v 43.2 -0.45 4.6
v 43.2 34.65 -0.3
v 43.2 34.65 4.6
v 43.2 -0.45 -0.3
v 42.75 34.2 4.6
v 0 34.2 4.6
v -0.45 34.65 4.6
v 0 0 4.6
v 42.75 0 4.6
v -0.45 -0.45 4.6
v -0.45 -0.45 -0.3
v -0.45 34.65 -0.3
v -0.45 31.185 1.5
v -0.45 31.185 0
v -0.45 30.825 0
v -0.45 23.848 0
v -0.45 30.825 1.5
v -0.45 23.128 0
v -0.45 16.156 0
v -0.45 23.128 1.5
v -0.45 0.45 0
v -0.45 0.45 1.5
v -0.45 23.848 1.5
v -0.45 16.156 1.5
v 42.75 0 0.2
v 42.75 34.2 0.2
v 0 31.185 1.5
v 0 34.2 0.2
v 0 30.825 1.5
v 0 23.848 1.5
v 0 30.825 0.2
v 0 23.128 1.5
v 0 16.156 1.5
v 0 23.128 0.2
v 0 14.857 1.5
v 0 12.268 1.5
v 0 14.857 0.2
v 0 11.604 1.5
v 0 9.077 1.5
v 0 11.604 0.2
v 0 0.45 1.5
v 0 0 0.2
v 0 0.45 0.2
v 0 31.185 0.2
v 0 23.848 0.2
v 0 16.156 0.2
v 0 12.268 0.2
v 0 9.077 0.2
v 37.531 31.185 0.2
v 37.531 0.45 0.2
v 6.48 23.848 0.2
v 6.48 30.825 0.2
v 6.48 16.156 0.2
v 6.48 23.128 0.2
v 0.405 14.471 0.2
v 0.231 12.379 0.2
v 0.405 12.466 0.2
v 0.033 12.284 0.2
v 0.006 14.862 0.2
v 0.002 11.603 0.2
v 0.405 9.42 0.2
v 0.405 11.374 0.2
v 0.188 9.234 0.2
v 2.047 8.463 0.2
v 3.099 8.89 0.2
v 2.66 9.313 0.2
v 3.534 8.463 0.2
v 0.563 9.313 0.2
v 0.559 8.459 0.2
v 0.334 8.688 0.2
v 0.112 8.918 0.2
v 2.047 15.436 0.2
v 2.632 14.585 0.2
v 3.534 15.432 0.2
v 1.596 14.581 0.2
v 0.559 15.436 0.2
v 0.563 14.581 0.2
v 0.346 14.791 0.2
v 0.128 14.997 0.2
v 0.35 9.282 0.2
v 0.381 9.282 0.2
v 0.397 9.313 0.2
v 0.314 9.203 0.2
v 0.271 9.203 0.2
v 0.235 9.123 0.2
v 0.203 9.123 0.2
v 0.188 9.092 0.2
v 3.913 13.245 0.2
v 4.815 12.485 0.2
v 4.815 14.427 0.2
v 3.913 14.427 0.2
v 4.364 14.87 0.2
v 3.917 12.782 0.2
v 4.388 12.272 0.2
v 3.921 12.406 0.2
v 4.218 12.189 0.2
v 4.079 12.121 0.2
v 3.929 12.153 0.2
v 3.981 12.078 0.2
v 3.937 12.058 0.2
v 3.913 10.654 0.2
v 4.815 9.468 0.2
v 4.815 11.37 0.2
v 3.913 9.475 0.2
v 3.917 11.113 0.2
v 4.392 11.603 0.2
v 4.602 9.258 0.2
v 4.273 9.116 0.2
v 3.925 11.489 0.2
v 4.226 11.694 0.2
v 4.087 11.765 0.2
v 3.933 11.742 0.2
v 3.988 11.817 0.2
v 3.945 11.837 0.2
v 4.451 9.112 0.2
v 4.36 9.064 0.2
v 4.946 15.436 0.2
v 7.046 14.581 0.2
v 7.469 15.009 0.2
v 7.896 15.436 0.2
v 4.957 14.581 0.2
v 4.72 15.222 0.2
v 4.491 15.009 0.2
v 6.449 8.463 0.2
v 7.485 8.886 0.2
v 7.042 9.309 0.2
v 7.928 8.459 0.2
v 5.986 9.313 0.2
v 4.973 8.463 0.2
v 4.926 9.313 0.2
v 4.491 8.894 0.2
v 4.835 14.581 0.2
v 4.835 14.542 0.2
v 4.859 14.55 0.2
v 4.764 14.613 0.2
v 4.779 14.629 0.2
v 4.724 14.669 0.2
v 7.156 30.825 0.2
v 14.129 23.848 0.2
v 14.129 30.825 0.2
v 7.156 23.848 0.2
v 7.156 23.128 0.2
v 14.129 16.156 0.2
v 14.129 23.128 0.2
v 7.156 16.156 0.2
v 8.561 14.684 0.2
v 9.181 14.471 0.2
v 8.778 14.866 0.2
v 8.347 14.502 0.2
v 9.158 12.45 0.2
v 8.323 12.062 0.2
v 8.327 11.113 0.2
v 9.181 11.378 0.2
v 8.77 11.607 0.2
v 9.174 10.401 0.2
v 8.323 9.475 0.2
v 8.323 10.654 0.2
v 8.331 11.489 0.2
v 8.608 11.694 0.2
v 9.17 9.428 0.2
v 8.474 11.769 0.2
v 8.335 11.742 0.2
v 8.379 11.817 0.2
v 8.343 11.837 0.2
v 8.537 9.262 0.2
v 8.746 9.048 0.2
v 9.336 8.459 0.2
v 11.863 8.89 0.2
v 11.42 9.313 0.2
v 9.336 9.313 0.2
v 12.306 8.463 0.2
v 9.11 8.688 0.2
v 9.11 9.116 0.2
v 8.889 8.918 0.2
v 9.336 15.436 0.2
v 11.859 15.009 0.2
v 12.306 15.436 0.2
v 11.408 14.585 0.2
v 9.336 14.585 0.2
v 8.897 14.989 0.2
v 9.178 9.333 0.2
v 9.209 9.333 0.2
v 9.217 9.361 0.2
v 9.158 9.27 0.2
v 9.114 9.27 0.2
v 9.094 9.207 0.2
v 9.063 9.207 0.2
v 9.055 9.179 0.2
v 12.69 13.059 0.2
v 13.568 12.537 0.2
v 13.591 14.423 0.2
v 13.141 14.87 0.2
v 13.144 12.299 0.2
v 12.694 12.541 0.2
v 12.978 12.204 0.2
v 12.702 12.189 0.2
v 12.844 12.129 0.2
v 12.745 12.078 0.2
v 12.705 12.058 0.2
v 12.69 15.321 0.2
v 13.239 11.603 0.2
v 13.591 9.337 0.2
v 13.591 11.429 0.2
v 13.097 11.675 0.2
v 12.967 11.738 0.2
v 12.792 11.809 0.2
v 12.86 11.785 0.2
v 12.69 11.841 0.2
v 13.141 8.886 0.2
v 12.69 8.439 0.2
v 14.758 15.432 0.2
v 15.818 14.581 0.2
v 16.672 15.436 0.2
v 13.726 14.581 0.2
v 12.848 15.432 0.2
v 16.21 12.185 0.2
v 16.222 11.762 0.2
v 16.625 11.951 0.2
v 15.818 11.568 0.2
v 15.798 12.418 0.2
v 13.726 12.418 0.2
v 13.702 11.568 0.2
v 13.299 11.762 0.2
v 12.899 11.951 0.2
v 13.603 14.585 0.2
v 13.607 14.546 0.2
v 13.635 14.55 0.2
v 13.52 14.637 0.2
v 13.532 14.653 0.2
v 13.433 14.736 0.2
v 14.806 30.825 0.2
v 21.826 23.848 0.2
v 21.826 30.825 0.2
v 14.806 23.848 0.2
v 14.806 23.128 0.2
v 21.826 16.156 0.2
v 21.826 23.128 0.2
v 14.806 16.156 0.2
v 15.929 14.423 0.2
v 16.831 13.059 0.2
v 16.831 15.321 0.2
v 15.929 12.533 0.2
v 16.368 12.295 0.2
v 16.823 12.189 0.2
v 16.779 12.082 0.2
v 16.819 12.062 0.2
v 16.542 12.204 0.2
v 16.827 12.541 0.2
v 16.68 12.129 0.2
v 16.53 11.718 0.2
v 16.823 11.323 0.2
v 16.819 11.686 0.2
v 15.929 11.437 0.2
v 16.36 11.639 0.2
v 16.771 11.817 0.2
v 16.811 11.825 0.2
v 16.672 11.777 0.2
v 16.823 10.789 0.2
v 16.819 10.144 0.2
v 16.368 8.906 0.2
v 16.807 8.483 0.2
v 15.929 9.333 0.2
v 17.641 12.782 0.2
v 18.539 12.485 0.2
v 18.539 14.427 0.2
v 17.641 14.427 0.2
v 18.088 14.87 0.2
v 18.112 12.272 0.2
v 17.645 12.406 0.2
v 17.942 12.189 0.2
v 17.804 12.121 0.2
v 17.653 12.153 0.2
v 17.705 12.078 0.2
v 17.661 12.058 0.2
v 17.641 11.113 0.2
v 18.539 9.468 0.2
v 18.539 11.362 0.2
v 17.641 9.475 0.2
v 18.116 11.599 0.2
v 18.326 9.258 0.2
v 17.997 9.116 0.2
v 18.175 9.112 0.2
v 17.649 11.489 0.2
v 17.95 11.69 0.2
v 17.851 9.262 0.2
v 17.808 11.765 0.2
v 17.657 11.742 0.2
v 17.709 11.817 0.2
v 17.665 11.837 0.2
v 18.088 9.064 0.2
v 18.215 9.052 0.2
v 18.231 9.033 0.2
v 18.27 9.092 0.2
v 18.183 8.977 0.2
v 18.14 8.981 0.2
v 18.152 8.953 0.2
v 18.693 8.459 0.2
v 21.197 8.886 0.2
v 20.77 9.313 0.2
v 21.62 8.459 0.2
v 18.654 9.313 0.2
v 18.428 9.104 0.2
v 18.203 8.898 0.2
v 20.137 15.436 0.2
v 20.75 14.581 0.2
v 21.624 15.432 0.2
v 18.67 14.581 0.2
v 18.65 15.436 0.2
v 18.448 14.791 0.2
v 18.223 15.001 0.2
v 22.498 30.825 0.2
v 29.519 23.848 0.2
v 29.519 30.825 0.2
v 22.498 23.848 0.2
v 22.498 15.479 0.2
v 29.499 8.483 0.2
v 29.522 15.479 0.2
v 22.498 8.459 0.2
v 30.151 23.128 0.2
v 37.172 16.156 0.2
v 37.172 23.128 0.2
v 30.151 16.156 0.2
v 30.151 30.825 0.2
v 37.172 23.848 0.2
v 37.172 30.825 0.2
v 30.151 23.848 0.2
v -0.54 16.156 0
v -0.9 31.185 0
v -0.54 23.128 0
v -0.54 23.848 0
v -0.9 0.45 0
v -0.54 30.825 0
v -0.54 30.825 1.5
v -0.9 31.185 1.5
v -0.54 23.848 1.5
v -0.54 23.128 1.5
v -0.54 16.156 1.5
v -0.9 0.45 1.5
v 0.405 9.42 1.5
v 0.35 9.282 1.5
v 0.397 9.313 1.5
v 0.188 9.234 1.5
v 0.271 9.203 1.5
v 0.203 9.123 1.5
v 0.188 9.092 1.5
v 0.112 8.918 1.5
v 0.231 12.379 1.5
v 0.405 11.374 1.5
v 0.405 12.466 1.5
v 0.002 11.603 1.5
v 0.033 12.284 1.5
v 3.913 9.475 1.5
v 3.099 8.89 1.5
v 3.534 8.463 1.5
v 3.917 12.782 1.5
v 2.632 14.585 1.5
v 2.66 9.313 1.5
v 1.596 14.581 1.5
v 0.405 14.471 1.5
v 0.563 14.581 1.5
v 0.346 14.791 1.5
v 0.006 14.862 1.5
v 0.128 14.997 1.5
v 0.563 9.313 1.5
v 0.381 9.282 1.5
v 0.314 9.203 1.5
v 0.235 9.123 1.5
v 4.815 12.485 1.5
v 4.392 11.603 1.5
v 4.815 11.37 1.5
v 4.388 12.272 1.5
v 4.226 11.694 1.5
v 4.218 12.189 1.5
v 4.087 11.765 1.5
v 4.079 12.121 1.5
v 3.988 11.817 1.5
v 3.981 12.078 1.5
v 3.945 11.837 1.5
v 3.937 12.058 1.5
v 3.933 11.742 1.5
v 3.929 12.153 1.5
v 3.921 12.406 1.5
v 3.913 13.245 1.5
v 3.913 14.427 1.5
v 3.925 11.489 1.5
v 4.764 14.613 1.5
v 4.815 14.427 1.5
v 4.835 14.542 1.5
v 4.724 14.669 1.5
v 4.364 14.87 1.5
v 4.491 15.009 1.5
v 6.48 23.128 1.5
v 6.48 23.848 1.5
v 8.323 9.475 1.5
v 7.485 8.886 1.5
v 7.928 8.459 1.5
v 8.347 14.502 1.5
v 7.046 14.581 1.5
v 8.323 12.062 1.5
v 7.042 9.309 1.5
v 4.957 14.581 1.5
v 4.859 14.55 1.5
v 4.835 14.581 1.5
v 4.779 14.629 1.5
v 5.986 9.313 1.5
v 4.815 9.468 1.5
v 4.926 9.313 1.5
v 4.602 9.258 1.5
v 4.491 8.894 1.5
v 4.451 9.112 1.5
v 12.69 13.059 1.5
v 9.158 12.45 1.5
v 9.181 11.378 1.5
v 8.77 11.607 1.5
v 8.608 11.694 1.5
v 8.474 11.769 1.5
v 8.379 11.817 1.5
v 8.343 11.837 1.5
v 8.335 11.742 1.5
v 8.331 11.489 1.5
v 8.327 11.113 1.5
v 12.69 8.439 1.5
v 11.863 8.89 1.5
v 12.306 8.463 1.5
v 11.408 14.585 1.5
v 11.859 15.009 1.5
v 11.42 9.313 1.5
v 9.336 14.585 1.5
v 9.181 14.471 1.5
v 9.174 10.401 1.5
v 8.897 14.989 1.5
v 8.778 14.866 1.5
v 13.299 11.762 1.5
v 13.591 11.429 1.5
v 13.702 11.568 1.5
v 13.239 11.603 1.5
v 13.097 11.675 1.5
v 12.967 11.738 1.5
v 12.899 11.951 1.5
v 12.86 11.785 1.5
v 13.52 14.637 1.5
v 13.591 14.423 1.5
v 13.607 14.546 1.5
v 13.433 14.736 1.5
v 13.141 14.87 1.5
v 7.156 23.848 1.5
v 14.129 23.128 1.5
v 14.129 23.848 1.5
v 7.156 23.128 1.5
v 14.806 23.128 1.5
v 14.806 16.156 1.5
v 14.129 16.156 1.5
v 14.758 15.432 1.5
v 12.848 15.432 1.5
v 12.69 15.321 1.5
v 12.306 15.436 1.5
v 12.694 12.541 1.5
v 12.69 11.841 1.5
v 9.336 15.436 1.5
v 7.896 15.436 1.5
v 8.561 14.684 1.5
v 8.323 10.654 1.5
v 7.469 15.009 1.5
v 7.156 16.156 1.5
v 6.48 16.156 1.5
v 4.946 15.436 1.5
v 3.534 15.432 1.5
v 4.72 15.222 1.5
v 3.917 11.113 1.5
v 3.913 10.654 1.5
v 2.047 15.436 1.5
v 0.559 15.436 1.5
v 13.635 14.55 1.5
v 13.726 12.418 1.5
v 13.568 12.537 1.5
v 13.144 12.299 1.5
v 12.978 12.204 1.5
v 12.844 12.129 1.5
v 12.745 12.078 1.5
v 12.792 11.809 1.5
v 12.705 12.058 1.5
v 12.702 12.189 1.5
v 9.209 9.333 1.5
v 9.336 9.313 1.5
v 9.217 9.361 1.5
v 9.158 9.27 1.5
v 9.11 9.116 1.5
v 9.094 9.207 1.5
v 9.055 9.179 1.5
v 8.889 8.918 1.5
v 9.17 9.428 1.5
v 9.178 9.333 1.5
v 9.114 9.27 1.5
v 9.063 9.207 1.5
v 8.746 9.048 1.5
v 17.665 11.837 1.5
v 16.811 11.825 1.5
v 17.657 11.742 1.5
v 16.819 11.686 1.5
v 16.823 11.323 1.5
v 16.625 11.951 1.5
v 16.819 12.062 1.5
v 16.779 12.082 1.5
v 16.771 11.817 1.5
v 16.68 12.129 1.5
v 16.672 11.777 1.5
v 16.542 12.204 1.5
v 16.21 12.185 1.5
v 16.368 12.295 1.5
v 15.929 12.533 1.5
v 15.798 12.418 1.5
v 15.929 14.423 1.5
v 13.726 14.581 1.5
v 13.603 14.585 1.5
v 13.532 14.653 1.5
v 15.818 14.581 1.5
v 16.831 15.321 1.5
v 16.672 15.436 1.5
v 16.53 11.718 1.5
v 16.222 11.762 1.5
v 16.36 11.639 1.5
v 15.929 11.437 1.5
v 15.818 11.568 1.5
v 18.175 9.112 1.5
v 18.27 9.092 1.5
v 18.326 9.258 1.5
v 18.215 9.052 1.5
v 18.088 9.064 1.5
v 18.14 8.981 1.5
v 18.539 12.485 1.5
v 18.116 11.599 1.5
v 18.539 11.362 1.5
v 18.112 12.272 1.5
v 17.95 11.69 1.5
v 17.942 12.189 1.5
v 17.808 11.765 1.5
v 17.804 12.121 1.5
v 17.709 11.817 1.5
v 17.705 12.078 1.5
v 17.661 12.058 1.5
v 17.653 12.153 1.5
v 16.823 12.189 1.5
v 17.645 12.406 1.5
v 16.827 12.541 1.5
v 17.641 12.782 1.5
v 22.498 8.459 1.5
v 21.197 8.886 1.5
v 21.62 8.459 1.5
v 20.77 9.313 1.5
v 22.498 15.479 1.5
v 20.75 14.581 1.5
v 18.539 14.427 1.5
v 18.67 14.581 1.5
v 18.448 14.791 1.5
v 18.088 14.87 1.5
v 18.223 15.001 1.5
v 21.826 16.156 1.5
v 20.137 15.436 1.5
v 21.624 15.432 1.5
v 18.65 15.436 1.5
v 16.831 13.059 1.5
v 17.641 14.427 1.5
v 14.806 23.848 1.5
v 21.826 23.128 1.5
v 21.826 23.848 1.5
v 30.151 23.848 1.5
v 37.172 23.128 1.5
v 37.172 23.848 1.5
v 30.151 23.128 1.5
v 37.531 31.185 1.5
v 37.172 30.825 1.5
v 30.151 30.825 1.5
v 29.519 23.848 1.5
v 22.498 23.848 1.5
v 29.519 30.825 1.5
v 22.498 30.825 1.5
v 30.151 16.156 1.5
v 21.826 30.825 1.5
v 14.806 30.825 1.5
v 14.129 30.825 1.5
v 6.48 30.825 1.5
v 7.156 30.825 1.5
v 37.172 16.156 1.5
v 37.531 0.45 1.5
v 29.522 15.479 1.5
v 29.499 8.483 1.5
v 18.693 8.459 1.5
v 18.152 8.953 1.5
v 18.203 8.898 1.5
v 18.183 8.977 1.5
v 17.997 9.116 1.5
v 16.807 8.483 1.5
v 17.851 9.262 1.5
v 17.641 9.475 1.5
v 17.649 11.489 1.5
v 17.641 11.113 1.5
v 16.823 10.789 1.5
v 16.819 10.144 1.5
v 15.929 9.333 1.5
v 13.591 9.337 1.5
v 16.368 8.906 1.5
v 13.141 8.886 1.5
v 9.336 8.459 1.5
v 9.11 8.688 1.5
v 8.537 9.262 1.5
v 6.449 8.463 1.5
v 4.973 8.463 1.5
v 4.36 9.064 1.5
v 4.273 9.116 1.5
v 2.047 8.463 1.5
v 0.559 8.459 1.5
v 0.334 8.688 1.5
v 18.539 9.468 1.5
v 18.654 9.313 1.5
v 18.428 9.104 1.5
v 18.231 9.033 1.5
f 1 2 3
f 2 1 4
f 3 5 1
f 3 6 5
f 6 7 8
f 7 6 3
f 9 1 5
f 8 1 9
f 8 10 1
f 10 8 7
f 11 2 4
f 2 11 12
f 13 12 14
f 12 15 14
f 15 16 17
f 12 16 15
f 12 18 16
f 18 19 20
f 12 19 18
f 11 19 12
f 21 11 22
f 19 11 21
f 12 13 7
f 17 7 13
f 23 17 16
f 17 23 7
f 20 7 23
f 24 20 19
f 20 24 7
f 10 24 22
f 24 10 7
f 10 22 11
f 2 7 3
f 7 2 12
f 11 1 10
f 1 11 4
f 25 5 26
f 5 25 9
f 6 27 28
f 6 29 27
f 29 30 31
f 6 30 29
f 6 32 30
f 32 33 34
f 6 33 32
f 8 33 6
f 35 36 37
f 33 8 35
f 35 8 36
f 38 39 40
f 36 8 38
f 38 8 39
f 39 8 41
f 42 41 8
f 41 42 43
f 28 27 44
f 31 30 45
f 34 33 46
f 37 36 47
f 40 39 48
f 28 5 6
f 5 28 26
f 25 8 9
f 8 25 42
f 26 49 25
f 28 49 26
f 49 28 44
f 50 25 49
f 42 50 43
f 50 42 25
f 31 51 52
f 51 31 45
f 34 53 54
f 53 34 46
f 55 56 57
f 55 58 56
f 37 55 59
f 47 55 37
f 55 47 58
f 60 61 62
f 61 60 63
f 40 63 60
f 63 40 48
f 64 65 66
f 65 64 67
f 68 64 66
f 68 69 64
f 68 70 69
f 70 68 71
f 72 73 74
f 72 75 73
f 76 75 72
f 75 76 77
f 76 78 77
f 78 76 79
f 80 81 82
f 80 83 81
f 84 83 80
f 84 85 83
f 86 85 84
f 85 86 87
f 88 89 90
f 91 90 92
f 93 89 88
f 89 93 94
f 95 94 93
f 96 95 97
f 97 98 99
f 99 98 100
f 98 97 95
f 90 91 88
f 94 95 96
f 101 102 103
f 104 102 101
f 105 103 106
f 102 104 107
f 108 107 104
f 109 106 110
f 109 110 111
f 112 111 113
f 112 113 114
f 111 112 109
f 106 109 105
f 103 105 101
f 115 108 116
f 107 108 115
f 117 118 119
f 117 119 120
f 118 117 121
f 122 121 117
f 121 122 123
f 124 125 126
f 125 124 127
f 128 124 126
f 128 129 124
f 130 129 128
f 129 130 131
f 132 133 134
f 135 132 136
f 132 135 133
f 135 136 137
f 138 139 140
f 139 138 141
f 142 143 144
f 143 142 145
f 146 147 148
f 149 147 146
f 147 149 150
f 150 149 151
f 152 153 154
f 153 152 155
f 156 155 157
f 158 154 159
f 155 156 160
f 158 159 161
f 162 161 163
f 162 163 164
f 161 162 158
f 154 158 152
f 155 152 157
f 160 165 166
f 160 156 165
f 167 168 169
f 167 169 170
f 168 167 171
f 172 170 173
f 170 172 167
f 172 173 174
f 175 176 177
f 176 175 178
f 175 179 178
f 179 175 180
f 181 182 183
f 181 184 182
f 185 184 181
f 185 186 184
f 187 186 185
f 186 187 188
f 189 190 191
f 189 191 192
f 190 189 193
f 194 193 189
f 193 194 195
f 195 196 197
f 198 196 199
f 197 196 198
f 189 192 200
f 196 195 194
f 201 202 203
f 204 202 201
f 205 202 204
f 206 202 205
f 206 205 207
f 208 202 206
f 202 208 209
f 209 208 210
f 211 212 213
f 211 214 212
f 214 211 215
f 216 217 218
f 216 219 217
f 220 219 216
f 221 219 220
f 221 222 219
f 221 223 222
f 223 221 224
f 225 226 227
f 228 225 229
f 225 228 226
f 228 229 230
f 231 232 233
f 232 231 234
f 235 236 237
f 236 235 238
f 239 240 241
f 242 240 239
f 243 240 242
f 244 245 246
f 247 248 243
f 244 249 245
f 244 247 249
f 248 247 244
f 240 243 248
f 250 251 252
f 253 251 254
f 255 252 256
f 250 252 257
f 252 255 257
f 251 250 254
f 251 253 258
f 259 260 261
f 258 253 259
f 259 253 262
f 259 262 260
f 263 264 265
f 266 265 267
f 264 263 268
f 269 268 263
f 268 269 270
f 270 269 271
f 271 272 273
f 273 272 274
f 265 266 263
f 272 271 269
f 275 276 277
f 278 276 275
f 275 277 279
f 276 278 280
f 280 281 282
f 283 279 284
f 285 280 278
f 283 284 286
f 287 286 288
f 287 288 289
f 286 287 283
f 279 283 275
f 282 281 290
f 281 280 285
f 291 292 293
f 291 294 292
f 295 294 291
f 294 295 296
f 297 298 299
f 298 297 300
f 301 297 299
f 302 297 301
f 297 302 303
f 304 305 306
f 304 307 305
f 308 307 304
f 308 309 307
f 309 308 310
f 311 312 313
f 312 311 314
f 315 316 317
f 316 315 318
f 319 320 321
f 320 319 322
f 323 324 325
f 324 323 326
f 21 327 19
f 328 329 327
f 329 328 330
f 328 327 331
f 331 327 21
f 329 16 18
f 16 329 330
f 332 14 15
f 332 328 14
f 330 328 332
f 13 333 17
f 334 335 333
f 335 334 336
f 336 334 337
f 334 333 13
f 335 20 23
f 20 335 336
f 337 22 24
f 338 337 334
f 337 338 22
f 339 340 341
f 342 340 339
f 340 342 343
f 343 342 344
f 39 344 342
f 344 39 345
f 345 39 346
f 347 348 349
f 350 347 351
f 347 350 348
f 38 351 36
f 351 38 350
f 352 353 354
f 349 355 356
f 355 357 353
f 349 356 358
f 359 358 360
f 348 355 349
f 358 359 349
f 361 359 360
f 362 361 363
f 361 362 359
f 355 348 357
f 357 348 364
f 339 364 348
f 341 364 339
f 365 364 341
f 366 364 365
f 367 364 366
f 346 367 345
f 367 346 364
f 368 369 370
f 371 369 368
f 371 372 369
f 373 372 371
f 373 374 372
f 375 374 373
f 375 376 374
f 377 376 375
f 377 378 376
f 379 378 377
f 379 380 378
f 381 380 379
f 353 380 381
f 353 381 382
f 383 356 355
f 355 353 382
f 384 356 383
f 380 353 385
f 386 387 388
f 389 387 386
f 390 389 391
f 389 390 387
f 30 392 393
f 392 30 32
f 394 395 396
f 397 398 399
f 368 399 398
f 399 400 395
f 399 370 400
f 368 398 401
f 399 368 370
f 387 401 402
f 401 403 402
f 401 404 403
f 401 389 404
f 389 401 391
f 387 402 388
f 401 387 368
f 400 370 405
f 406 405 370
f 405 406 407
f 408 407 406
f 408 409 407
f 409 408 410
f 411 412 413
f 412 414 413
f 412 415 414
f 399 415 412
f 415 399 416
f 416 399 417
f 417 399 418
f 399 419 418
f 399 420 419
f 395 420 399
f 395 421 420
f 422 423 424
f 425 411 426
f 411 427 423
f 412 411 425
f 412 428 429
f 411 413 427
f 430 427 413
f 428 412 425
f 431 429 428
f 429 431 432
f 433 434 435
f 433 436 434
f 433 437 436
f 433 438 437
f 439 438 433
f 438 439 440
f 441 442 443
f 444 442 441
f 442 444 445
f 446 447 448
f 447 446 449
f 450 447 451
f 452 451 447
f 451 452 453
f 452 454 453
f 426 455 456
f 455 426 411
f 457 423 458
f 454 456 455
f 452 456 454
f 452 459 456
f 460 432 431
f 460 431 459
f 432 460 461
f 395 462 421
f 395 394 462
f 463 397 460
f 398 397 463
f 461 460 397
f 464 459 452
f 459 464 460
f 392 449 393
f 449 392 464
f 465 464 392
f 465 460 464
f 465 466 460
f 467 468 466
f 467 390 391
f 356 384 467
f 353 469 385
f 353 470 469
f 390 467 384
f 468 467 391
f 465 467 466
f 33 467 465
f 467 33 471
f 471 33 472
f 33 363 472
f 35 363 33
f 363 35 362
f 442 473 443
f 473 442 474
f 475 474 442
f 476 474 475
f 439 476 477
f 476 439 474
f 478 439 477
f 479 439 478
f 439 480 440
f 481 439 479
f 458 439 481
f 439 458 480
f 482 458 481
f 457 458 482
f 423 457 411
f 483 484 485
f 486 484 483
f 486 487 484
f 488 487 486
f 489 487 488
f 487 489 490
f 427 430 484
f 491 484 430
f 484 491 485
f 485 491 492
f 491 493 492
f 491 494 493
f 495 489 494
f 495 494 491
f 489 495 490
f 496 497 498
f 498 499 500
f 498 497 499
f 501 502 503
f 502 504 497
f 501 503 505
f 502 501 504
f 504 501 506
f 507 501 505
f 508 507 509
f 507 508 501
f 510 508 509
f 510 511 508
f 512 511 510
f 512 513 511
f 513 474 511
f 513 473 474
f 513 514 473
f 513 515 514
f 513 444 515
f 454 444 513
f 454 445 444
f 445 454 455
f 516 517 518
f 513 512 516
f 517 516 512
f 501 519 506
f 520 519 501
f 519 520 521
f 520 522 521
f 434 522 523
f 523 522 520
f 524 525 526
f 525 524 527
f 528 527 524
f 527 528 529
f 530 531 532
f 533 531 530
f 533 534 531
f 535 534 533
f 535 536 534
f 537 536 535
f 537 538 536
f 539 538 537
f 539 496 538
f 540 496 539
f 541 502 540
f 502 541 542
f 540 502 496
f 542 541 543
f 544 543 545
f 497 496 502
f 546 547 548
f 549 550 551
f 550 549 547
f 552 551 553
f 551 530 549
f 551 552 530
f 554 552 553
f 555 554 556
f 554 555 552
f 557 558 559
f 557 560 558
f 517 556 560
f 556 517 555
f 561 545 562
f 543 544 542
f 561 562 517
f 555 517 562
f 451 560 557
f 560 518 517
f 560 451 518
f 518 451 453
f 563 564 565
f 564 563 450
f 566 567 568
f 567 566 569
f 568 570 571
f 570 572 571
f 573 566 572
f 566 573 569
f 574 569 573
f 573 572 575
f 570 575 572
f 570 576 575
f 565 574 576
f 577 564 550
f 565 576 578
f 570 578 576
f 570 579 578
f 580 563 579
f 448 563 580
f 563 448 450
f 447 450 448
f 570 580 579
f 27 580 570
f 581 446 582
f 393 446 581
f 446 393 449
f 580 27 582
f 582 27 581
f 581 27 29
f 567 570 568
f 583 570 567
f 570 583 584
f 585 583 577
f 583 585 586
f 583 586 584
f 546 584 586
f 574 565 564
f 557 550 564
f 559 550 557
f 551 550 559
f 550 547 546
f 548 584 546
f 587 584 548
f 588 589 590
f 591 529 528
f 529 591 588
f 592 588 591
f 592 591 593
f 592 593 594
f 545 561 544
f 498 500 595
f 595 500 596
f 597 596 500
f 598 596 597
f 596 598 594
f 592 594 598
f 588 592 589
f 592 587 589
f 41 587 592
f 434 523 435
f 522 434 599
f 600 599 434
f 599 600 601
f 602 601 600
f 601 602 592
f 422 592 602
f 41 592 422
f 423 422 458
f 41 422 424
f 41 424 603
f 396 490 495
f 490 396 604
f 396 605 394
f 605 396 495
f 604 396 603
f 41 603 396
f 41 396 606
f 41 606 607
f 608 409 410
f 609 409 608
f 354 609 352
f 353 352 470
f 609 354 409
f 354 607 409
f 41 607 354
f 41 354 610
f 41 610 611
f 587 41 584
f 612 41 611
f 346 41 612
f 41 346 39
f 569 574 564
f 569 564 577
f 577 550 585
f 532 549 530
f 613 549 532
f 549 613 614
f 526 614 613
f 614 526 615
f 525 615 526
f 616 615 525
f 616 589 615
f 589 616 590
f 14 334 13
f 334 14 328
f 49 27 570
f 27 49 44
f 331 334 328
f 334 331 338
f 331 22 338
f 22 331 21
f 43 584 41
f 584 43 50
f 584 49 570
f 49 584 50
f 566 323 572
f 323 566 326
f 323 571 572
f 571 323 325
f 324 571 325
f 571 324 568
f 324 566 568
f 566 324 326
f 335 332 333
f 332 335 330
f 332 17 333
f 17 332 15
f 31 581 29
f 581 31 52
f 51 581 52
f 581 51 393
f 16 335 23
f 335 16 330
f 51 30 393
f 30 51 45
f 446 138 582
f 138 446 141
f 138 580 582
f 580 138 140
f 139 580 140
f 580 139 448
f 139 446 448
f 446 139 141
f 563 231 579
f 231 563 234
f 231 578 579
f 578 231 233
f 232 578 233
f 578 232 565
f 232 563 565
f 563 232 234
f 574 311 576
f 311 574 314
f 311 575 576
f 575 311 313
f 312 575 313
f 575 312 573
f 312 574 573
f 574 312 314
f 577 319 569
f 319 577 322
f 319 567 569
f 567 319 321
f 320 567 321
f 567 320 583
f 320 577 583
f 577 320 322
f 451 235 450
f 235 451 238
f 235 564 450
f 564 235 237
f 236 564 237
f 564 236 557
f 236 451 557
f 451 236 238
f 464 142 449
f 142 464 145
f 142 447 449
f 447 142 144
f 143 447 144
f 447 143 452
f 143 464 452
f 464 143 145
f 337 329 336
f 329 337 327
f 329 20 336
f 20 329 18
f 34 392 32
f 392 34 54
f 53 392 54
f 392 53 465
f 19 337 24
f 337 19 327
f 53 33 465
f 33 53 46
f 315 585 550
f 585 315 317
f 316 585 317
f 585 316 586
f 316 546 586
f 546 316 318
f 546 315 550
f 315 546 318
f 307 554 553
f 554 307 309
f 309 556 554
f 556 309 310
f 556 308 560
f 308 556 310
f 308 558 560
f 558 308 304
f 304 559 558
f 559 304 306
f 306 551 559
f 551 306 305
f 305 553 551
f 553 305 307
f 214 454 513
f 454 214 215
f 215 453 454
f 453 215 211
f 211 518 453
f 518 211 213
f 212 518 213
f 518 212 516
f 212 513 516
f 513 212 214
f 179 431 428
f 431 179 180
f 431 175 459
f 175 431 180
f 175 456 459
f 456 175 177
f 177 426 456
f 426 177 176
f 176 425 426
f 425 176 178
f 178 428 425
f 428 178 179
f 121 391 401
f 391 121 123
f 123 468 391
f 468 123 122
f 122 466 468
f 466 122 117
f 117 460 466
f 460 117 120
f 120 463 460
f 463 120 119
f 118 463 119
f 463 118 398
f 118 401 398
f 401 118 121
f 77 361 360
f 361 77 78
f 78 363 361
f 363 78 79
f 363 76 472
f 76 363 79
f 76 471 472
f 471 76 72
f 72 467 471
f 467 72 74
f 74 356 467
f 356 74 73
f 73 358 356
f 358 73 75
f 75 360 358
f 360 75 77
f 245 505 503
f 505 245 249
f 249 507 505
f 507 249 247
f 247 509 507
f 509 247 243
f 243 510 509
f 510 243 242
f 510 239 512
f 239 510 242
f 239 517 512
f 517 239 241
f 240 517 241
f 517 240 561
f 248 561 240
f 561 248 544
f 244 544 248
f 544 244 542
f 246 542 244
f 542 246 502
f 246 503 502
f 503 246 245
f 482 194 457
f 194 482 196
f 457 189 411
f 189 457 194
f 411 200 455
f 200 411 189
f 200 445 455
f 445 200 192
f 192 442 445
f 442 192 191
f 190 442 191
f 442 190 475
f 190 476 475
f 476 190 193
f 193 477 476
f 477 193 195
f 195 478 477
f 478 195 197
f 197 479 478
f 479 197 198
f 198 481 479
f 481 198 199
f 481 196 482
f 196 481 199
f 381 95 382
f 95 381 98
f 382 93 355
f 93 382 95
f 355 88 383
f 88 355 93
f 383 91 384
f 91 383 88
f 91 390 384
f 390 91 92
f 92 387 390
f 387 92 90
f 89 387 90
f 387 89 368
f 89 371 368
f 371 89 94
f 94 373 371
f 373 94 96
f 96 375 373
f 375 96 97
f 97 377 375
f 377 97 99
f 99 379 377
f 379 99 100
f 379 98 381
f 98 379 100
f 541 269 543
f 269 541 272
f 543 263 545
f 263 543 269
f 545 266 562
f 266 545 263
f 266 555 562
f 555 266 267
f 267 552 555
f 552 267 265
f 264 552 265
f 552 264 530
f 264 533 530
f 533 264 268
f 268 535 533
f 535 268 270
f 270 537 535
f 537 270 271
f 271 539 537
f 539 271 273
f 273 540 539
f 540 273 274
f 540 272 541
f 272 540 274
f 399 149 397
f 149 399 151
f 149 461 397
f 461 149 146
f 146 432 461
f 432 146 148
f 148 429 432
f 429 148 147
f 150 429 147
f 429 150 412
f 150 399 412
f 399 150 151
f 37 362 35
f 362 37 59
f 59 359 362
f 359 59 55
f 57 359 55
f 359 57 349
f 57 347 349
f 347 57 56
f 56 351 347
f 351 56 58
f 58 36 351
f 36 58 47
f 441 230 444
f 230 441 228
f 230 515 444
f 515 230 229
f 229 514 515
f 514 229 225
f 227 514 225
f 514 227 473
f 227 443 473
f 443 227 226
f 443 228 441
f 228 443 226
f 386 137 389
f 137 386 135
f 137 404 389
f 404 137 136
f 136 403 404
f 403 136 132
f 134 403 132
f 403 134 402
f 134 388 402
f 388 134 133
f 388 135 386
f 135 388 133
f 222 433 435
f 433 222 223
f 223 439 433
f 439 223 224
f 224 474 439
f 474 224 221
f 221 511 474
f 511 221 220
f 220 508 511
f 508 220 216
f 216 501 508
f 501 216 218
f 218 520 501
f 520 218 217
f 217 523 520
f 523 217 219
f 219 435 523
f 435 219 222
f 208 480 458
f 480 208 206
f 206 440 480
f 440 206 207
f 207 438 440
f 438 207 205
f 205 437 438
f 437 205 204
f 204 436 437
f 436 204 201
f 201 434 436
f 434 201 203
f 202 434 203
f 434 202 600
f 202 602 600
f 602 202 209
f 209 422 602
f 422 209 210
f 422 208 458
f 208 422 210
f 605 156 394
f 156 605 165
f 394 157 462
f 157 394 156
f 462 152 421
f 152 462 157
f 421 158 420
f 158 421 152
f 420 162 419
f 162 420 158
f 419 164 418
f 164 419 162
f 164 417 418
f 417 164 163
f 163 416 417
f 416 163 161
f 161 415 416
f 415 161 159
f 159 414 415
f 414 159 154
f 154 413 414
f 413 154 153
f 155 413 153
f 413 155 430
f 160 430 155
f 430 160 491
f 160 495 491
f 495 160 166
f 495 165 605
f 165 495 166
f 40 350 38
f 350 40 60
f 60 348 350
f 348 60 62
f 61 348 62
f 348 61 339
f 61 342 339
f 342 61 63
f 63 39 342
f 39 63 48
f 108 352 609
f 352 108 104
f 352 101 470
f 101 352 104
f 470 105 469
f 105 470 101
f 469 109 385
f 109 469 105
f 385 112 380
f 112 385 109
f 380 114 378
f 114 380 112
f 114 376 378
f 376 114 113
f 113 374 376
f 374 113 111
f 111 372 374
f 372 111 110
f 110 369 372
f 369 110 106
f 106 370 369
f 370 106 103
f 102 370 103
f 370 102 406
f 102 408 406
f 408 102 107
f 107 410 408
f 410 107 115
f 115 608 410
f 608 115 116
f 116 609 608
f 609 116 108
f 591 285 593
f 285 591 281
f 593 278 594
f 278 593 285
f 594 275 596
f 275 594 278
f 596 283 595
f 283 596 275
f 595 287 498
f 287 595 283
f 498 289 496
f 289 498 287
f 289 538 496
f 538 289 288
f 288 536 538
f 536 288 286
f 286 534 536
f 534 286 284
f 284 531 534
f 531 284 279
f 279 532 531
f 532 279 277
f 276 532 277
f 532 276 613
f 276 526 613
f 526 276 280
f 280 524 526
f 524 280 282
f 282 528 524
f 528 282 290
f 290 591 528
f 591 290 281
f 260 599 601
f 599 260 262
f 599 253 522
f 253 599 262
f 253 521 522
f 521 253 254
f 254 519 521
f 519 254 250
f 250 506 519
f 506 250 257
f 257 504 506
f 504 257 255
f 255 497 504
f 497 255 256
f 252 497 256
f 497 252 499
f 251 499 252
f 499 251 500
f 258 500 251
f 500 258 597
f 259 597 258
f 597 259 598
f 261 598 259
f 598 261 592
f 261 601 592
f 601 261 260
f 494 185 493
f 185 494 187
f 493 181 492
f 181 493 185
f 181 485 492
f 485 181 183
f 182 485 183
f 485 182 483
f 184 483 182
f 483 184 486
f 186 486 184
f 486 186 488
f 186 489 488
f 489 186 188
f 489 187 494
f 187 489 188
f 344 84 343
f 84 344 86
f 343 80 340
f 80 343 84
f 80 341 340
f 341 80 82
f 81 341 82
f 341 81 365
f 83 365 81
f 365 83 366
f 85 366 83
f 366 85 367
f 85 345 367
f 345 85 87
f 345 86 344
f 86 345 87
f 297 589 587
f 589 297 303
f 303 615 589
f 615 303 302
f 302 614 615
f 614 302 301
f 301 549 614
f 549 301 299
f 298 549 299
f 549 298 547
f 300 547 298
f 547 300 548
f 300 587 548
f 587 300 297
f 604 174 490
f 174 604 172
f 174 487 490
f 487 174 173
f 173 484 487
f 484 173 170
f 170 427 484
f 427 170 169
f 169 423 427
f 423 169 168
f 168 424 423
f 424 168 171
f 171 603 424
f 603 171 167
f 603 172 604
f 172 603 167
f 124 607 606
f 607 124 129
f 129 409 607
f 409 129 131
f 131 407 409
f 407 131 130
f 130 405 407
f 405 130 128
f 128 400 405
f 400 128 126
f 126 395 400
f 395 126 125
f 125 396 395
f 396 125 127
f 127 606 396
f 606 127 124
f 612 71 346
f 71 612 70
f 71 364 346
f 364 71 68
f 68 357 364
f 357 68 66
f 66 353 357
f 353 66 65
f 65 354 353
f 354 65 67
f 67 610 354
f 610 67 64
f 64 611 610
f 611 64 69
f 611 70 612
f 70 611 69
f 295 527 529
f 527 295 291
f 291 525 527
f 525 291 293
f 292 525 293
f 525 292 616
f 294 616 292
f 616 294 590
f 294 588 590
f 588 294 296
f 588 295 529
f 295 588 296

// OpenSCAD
module stamp_cccac(){
	union(){
		// Grundplatte
		translate([0,0,-0.3]) cube([9.5,7.6,0.5]);

		// Logo
		translate([-0.2, 0.1, 0]) scale([0.9, 0.9, 1])
		linear_extrude(height = 1.5, convexity = 10)
			import(file = "cccac.dxf");

		// Form
		difference(){
			translate([-0.1,-0.1,-0.3]) cube([9.7,7.8,4.9]);
			translate([0,0,-0.3]) cube([9.5,7.6,10]);
		}
	}
}

scale([4.5,4.5,1]) stamp_cccac();

// hackspace passport stamps are 47x41mm
//translate([0,0,-10]) cube([47,41,9.9]);
